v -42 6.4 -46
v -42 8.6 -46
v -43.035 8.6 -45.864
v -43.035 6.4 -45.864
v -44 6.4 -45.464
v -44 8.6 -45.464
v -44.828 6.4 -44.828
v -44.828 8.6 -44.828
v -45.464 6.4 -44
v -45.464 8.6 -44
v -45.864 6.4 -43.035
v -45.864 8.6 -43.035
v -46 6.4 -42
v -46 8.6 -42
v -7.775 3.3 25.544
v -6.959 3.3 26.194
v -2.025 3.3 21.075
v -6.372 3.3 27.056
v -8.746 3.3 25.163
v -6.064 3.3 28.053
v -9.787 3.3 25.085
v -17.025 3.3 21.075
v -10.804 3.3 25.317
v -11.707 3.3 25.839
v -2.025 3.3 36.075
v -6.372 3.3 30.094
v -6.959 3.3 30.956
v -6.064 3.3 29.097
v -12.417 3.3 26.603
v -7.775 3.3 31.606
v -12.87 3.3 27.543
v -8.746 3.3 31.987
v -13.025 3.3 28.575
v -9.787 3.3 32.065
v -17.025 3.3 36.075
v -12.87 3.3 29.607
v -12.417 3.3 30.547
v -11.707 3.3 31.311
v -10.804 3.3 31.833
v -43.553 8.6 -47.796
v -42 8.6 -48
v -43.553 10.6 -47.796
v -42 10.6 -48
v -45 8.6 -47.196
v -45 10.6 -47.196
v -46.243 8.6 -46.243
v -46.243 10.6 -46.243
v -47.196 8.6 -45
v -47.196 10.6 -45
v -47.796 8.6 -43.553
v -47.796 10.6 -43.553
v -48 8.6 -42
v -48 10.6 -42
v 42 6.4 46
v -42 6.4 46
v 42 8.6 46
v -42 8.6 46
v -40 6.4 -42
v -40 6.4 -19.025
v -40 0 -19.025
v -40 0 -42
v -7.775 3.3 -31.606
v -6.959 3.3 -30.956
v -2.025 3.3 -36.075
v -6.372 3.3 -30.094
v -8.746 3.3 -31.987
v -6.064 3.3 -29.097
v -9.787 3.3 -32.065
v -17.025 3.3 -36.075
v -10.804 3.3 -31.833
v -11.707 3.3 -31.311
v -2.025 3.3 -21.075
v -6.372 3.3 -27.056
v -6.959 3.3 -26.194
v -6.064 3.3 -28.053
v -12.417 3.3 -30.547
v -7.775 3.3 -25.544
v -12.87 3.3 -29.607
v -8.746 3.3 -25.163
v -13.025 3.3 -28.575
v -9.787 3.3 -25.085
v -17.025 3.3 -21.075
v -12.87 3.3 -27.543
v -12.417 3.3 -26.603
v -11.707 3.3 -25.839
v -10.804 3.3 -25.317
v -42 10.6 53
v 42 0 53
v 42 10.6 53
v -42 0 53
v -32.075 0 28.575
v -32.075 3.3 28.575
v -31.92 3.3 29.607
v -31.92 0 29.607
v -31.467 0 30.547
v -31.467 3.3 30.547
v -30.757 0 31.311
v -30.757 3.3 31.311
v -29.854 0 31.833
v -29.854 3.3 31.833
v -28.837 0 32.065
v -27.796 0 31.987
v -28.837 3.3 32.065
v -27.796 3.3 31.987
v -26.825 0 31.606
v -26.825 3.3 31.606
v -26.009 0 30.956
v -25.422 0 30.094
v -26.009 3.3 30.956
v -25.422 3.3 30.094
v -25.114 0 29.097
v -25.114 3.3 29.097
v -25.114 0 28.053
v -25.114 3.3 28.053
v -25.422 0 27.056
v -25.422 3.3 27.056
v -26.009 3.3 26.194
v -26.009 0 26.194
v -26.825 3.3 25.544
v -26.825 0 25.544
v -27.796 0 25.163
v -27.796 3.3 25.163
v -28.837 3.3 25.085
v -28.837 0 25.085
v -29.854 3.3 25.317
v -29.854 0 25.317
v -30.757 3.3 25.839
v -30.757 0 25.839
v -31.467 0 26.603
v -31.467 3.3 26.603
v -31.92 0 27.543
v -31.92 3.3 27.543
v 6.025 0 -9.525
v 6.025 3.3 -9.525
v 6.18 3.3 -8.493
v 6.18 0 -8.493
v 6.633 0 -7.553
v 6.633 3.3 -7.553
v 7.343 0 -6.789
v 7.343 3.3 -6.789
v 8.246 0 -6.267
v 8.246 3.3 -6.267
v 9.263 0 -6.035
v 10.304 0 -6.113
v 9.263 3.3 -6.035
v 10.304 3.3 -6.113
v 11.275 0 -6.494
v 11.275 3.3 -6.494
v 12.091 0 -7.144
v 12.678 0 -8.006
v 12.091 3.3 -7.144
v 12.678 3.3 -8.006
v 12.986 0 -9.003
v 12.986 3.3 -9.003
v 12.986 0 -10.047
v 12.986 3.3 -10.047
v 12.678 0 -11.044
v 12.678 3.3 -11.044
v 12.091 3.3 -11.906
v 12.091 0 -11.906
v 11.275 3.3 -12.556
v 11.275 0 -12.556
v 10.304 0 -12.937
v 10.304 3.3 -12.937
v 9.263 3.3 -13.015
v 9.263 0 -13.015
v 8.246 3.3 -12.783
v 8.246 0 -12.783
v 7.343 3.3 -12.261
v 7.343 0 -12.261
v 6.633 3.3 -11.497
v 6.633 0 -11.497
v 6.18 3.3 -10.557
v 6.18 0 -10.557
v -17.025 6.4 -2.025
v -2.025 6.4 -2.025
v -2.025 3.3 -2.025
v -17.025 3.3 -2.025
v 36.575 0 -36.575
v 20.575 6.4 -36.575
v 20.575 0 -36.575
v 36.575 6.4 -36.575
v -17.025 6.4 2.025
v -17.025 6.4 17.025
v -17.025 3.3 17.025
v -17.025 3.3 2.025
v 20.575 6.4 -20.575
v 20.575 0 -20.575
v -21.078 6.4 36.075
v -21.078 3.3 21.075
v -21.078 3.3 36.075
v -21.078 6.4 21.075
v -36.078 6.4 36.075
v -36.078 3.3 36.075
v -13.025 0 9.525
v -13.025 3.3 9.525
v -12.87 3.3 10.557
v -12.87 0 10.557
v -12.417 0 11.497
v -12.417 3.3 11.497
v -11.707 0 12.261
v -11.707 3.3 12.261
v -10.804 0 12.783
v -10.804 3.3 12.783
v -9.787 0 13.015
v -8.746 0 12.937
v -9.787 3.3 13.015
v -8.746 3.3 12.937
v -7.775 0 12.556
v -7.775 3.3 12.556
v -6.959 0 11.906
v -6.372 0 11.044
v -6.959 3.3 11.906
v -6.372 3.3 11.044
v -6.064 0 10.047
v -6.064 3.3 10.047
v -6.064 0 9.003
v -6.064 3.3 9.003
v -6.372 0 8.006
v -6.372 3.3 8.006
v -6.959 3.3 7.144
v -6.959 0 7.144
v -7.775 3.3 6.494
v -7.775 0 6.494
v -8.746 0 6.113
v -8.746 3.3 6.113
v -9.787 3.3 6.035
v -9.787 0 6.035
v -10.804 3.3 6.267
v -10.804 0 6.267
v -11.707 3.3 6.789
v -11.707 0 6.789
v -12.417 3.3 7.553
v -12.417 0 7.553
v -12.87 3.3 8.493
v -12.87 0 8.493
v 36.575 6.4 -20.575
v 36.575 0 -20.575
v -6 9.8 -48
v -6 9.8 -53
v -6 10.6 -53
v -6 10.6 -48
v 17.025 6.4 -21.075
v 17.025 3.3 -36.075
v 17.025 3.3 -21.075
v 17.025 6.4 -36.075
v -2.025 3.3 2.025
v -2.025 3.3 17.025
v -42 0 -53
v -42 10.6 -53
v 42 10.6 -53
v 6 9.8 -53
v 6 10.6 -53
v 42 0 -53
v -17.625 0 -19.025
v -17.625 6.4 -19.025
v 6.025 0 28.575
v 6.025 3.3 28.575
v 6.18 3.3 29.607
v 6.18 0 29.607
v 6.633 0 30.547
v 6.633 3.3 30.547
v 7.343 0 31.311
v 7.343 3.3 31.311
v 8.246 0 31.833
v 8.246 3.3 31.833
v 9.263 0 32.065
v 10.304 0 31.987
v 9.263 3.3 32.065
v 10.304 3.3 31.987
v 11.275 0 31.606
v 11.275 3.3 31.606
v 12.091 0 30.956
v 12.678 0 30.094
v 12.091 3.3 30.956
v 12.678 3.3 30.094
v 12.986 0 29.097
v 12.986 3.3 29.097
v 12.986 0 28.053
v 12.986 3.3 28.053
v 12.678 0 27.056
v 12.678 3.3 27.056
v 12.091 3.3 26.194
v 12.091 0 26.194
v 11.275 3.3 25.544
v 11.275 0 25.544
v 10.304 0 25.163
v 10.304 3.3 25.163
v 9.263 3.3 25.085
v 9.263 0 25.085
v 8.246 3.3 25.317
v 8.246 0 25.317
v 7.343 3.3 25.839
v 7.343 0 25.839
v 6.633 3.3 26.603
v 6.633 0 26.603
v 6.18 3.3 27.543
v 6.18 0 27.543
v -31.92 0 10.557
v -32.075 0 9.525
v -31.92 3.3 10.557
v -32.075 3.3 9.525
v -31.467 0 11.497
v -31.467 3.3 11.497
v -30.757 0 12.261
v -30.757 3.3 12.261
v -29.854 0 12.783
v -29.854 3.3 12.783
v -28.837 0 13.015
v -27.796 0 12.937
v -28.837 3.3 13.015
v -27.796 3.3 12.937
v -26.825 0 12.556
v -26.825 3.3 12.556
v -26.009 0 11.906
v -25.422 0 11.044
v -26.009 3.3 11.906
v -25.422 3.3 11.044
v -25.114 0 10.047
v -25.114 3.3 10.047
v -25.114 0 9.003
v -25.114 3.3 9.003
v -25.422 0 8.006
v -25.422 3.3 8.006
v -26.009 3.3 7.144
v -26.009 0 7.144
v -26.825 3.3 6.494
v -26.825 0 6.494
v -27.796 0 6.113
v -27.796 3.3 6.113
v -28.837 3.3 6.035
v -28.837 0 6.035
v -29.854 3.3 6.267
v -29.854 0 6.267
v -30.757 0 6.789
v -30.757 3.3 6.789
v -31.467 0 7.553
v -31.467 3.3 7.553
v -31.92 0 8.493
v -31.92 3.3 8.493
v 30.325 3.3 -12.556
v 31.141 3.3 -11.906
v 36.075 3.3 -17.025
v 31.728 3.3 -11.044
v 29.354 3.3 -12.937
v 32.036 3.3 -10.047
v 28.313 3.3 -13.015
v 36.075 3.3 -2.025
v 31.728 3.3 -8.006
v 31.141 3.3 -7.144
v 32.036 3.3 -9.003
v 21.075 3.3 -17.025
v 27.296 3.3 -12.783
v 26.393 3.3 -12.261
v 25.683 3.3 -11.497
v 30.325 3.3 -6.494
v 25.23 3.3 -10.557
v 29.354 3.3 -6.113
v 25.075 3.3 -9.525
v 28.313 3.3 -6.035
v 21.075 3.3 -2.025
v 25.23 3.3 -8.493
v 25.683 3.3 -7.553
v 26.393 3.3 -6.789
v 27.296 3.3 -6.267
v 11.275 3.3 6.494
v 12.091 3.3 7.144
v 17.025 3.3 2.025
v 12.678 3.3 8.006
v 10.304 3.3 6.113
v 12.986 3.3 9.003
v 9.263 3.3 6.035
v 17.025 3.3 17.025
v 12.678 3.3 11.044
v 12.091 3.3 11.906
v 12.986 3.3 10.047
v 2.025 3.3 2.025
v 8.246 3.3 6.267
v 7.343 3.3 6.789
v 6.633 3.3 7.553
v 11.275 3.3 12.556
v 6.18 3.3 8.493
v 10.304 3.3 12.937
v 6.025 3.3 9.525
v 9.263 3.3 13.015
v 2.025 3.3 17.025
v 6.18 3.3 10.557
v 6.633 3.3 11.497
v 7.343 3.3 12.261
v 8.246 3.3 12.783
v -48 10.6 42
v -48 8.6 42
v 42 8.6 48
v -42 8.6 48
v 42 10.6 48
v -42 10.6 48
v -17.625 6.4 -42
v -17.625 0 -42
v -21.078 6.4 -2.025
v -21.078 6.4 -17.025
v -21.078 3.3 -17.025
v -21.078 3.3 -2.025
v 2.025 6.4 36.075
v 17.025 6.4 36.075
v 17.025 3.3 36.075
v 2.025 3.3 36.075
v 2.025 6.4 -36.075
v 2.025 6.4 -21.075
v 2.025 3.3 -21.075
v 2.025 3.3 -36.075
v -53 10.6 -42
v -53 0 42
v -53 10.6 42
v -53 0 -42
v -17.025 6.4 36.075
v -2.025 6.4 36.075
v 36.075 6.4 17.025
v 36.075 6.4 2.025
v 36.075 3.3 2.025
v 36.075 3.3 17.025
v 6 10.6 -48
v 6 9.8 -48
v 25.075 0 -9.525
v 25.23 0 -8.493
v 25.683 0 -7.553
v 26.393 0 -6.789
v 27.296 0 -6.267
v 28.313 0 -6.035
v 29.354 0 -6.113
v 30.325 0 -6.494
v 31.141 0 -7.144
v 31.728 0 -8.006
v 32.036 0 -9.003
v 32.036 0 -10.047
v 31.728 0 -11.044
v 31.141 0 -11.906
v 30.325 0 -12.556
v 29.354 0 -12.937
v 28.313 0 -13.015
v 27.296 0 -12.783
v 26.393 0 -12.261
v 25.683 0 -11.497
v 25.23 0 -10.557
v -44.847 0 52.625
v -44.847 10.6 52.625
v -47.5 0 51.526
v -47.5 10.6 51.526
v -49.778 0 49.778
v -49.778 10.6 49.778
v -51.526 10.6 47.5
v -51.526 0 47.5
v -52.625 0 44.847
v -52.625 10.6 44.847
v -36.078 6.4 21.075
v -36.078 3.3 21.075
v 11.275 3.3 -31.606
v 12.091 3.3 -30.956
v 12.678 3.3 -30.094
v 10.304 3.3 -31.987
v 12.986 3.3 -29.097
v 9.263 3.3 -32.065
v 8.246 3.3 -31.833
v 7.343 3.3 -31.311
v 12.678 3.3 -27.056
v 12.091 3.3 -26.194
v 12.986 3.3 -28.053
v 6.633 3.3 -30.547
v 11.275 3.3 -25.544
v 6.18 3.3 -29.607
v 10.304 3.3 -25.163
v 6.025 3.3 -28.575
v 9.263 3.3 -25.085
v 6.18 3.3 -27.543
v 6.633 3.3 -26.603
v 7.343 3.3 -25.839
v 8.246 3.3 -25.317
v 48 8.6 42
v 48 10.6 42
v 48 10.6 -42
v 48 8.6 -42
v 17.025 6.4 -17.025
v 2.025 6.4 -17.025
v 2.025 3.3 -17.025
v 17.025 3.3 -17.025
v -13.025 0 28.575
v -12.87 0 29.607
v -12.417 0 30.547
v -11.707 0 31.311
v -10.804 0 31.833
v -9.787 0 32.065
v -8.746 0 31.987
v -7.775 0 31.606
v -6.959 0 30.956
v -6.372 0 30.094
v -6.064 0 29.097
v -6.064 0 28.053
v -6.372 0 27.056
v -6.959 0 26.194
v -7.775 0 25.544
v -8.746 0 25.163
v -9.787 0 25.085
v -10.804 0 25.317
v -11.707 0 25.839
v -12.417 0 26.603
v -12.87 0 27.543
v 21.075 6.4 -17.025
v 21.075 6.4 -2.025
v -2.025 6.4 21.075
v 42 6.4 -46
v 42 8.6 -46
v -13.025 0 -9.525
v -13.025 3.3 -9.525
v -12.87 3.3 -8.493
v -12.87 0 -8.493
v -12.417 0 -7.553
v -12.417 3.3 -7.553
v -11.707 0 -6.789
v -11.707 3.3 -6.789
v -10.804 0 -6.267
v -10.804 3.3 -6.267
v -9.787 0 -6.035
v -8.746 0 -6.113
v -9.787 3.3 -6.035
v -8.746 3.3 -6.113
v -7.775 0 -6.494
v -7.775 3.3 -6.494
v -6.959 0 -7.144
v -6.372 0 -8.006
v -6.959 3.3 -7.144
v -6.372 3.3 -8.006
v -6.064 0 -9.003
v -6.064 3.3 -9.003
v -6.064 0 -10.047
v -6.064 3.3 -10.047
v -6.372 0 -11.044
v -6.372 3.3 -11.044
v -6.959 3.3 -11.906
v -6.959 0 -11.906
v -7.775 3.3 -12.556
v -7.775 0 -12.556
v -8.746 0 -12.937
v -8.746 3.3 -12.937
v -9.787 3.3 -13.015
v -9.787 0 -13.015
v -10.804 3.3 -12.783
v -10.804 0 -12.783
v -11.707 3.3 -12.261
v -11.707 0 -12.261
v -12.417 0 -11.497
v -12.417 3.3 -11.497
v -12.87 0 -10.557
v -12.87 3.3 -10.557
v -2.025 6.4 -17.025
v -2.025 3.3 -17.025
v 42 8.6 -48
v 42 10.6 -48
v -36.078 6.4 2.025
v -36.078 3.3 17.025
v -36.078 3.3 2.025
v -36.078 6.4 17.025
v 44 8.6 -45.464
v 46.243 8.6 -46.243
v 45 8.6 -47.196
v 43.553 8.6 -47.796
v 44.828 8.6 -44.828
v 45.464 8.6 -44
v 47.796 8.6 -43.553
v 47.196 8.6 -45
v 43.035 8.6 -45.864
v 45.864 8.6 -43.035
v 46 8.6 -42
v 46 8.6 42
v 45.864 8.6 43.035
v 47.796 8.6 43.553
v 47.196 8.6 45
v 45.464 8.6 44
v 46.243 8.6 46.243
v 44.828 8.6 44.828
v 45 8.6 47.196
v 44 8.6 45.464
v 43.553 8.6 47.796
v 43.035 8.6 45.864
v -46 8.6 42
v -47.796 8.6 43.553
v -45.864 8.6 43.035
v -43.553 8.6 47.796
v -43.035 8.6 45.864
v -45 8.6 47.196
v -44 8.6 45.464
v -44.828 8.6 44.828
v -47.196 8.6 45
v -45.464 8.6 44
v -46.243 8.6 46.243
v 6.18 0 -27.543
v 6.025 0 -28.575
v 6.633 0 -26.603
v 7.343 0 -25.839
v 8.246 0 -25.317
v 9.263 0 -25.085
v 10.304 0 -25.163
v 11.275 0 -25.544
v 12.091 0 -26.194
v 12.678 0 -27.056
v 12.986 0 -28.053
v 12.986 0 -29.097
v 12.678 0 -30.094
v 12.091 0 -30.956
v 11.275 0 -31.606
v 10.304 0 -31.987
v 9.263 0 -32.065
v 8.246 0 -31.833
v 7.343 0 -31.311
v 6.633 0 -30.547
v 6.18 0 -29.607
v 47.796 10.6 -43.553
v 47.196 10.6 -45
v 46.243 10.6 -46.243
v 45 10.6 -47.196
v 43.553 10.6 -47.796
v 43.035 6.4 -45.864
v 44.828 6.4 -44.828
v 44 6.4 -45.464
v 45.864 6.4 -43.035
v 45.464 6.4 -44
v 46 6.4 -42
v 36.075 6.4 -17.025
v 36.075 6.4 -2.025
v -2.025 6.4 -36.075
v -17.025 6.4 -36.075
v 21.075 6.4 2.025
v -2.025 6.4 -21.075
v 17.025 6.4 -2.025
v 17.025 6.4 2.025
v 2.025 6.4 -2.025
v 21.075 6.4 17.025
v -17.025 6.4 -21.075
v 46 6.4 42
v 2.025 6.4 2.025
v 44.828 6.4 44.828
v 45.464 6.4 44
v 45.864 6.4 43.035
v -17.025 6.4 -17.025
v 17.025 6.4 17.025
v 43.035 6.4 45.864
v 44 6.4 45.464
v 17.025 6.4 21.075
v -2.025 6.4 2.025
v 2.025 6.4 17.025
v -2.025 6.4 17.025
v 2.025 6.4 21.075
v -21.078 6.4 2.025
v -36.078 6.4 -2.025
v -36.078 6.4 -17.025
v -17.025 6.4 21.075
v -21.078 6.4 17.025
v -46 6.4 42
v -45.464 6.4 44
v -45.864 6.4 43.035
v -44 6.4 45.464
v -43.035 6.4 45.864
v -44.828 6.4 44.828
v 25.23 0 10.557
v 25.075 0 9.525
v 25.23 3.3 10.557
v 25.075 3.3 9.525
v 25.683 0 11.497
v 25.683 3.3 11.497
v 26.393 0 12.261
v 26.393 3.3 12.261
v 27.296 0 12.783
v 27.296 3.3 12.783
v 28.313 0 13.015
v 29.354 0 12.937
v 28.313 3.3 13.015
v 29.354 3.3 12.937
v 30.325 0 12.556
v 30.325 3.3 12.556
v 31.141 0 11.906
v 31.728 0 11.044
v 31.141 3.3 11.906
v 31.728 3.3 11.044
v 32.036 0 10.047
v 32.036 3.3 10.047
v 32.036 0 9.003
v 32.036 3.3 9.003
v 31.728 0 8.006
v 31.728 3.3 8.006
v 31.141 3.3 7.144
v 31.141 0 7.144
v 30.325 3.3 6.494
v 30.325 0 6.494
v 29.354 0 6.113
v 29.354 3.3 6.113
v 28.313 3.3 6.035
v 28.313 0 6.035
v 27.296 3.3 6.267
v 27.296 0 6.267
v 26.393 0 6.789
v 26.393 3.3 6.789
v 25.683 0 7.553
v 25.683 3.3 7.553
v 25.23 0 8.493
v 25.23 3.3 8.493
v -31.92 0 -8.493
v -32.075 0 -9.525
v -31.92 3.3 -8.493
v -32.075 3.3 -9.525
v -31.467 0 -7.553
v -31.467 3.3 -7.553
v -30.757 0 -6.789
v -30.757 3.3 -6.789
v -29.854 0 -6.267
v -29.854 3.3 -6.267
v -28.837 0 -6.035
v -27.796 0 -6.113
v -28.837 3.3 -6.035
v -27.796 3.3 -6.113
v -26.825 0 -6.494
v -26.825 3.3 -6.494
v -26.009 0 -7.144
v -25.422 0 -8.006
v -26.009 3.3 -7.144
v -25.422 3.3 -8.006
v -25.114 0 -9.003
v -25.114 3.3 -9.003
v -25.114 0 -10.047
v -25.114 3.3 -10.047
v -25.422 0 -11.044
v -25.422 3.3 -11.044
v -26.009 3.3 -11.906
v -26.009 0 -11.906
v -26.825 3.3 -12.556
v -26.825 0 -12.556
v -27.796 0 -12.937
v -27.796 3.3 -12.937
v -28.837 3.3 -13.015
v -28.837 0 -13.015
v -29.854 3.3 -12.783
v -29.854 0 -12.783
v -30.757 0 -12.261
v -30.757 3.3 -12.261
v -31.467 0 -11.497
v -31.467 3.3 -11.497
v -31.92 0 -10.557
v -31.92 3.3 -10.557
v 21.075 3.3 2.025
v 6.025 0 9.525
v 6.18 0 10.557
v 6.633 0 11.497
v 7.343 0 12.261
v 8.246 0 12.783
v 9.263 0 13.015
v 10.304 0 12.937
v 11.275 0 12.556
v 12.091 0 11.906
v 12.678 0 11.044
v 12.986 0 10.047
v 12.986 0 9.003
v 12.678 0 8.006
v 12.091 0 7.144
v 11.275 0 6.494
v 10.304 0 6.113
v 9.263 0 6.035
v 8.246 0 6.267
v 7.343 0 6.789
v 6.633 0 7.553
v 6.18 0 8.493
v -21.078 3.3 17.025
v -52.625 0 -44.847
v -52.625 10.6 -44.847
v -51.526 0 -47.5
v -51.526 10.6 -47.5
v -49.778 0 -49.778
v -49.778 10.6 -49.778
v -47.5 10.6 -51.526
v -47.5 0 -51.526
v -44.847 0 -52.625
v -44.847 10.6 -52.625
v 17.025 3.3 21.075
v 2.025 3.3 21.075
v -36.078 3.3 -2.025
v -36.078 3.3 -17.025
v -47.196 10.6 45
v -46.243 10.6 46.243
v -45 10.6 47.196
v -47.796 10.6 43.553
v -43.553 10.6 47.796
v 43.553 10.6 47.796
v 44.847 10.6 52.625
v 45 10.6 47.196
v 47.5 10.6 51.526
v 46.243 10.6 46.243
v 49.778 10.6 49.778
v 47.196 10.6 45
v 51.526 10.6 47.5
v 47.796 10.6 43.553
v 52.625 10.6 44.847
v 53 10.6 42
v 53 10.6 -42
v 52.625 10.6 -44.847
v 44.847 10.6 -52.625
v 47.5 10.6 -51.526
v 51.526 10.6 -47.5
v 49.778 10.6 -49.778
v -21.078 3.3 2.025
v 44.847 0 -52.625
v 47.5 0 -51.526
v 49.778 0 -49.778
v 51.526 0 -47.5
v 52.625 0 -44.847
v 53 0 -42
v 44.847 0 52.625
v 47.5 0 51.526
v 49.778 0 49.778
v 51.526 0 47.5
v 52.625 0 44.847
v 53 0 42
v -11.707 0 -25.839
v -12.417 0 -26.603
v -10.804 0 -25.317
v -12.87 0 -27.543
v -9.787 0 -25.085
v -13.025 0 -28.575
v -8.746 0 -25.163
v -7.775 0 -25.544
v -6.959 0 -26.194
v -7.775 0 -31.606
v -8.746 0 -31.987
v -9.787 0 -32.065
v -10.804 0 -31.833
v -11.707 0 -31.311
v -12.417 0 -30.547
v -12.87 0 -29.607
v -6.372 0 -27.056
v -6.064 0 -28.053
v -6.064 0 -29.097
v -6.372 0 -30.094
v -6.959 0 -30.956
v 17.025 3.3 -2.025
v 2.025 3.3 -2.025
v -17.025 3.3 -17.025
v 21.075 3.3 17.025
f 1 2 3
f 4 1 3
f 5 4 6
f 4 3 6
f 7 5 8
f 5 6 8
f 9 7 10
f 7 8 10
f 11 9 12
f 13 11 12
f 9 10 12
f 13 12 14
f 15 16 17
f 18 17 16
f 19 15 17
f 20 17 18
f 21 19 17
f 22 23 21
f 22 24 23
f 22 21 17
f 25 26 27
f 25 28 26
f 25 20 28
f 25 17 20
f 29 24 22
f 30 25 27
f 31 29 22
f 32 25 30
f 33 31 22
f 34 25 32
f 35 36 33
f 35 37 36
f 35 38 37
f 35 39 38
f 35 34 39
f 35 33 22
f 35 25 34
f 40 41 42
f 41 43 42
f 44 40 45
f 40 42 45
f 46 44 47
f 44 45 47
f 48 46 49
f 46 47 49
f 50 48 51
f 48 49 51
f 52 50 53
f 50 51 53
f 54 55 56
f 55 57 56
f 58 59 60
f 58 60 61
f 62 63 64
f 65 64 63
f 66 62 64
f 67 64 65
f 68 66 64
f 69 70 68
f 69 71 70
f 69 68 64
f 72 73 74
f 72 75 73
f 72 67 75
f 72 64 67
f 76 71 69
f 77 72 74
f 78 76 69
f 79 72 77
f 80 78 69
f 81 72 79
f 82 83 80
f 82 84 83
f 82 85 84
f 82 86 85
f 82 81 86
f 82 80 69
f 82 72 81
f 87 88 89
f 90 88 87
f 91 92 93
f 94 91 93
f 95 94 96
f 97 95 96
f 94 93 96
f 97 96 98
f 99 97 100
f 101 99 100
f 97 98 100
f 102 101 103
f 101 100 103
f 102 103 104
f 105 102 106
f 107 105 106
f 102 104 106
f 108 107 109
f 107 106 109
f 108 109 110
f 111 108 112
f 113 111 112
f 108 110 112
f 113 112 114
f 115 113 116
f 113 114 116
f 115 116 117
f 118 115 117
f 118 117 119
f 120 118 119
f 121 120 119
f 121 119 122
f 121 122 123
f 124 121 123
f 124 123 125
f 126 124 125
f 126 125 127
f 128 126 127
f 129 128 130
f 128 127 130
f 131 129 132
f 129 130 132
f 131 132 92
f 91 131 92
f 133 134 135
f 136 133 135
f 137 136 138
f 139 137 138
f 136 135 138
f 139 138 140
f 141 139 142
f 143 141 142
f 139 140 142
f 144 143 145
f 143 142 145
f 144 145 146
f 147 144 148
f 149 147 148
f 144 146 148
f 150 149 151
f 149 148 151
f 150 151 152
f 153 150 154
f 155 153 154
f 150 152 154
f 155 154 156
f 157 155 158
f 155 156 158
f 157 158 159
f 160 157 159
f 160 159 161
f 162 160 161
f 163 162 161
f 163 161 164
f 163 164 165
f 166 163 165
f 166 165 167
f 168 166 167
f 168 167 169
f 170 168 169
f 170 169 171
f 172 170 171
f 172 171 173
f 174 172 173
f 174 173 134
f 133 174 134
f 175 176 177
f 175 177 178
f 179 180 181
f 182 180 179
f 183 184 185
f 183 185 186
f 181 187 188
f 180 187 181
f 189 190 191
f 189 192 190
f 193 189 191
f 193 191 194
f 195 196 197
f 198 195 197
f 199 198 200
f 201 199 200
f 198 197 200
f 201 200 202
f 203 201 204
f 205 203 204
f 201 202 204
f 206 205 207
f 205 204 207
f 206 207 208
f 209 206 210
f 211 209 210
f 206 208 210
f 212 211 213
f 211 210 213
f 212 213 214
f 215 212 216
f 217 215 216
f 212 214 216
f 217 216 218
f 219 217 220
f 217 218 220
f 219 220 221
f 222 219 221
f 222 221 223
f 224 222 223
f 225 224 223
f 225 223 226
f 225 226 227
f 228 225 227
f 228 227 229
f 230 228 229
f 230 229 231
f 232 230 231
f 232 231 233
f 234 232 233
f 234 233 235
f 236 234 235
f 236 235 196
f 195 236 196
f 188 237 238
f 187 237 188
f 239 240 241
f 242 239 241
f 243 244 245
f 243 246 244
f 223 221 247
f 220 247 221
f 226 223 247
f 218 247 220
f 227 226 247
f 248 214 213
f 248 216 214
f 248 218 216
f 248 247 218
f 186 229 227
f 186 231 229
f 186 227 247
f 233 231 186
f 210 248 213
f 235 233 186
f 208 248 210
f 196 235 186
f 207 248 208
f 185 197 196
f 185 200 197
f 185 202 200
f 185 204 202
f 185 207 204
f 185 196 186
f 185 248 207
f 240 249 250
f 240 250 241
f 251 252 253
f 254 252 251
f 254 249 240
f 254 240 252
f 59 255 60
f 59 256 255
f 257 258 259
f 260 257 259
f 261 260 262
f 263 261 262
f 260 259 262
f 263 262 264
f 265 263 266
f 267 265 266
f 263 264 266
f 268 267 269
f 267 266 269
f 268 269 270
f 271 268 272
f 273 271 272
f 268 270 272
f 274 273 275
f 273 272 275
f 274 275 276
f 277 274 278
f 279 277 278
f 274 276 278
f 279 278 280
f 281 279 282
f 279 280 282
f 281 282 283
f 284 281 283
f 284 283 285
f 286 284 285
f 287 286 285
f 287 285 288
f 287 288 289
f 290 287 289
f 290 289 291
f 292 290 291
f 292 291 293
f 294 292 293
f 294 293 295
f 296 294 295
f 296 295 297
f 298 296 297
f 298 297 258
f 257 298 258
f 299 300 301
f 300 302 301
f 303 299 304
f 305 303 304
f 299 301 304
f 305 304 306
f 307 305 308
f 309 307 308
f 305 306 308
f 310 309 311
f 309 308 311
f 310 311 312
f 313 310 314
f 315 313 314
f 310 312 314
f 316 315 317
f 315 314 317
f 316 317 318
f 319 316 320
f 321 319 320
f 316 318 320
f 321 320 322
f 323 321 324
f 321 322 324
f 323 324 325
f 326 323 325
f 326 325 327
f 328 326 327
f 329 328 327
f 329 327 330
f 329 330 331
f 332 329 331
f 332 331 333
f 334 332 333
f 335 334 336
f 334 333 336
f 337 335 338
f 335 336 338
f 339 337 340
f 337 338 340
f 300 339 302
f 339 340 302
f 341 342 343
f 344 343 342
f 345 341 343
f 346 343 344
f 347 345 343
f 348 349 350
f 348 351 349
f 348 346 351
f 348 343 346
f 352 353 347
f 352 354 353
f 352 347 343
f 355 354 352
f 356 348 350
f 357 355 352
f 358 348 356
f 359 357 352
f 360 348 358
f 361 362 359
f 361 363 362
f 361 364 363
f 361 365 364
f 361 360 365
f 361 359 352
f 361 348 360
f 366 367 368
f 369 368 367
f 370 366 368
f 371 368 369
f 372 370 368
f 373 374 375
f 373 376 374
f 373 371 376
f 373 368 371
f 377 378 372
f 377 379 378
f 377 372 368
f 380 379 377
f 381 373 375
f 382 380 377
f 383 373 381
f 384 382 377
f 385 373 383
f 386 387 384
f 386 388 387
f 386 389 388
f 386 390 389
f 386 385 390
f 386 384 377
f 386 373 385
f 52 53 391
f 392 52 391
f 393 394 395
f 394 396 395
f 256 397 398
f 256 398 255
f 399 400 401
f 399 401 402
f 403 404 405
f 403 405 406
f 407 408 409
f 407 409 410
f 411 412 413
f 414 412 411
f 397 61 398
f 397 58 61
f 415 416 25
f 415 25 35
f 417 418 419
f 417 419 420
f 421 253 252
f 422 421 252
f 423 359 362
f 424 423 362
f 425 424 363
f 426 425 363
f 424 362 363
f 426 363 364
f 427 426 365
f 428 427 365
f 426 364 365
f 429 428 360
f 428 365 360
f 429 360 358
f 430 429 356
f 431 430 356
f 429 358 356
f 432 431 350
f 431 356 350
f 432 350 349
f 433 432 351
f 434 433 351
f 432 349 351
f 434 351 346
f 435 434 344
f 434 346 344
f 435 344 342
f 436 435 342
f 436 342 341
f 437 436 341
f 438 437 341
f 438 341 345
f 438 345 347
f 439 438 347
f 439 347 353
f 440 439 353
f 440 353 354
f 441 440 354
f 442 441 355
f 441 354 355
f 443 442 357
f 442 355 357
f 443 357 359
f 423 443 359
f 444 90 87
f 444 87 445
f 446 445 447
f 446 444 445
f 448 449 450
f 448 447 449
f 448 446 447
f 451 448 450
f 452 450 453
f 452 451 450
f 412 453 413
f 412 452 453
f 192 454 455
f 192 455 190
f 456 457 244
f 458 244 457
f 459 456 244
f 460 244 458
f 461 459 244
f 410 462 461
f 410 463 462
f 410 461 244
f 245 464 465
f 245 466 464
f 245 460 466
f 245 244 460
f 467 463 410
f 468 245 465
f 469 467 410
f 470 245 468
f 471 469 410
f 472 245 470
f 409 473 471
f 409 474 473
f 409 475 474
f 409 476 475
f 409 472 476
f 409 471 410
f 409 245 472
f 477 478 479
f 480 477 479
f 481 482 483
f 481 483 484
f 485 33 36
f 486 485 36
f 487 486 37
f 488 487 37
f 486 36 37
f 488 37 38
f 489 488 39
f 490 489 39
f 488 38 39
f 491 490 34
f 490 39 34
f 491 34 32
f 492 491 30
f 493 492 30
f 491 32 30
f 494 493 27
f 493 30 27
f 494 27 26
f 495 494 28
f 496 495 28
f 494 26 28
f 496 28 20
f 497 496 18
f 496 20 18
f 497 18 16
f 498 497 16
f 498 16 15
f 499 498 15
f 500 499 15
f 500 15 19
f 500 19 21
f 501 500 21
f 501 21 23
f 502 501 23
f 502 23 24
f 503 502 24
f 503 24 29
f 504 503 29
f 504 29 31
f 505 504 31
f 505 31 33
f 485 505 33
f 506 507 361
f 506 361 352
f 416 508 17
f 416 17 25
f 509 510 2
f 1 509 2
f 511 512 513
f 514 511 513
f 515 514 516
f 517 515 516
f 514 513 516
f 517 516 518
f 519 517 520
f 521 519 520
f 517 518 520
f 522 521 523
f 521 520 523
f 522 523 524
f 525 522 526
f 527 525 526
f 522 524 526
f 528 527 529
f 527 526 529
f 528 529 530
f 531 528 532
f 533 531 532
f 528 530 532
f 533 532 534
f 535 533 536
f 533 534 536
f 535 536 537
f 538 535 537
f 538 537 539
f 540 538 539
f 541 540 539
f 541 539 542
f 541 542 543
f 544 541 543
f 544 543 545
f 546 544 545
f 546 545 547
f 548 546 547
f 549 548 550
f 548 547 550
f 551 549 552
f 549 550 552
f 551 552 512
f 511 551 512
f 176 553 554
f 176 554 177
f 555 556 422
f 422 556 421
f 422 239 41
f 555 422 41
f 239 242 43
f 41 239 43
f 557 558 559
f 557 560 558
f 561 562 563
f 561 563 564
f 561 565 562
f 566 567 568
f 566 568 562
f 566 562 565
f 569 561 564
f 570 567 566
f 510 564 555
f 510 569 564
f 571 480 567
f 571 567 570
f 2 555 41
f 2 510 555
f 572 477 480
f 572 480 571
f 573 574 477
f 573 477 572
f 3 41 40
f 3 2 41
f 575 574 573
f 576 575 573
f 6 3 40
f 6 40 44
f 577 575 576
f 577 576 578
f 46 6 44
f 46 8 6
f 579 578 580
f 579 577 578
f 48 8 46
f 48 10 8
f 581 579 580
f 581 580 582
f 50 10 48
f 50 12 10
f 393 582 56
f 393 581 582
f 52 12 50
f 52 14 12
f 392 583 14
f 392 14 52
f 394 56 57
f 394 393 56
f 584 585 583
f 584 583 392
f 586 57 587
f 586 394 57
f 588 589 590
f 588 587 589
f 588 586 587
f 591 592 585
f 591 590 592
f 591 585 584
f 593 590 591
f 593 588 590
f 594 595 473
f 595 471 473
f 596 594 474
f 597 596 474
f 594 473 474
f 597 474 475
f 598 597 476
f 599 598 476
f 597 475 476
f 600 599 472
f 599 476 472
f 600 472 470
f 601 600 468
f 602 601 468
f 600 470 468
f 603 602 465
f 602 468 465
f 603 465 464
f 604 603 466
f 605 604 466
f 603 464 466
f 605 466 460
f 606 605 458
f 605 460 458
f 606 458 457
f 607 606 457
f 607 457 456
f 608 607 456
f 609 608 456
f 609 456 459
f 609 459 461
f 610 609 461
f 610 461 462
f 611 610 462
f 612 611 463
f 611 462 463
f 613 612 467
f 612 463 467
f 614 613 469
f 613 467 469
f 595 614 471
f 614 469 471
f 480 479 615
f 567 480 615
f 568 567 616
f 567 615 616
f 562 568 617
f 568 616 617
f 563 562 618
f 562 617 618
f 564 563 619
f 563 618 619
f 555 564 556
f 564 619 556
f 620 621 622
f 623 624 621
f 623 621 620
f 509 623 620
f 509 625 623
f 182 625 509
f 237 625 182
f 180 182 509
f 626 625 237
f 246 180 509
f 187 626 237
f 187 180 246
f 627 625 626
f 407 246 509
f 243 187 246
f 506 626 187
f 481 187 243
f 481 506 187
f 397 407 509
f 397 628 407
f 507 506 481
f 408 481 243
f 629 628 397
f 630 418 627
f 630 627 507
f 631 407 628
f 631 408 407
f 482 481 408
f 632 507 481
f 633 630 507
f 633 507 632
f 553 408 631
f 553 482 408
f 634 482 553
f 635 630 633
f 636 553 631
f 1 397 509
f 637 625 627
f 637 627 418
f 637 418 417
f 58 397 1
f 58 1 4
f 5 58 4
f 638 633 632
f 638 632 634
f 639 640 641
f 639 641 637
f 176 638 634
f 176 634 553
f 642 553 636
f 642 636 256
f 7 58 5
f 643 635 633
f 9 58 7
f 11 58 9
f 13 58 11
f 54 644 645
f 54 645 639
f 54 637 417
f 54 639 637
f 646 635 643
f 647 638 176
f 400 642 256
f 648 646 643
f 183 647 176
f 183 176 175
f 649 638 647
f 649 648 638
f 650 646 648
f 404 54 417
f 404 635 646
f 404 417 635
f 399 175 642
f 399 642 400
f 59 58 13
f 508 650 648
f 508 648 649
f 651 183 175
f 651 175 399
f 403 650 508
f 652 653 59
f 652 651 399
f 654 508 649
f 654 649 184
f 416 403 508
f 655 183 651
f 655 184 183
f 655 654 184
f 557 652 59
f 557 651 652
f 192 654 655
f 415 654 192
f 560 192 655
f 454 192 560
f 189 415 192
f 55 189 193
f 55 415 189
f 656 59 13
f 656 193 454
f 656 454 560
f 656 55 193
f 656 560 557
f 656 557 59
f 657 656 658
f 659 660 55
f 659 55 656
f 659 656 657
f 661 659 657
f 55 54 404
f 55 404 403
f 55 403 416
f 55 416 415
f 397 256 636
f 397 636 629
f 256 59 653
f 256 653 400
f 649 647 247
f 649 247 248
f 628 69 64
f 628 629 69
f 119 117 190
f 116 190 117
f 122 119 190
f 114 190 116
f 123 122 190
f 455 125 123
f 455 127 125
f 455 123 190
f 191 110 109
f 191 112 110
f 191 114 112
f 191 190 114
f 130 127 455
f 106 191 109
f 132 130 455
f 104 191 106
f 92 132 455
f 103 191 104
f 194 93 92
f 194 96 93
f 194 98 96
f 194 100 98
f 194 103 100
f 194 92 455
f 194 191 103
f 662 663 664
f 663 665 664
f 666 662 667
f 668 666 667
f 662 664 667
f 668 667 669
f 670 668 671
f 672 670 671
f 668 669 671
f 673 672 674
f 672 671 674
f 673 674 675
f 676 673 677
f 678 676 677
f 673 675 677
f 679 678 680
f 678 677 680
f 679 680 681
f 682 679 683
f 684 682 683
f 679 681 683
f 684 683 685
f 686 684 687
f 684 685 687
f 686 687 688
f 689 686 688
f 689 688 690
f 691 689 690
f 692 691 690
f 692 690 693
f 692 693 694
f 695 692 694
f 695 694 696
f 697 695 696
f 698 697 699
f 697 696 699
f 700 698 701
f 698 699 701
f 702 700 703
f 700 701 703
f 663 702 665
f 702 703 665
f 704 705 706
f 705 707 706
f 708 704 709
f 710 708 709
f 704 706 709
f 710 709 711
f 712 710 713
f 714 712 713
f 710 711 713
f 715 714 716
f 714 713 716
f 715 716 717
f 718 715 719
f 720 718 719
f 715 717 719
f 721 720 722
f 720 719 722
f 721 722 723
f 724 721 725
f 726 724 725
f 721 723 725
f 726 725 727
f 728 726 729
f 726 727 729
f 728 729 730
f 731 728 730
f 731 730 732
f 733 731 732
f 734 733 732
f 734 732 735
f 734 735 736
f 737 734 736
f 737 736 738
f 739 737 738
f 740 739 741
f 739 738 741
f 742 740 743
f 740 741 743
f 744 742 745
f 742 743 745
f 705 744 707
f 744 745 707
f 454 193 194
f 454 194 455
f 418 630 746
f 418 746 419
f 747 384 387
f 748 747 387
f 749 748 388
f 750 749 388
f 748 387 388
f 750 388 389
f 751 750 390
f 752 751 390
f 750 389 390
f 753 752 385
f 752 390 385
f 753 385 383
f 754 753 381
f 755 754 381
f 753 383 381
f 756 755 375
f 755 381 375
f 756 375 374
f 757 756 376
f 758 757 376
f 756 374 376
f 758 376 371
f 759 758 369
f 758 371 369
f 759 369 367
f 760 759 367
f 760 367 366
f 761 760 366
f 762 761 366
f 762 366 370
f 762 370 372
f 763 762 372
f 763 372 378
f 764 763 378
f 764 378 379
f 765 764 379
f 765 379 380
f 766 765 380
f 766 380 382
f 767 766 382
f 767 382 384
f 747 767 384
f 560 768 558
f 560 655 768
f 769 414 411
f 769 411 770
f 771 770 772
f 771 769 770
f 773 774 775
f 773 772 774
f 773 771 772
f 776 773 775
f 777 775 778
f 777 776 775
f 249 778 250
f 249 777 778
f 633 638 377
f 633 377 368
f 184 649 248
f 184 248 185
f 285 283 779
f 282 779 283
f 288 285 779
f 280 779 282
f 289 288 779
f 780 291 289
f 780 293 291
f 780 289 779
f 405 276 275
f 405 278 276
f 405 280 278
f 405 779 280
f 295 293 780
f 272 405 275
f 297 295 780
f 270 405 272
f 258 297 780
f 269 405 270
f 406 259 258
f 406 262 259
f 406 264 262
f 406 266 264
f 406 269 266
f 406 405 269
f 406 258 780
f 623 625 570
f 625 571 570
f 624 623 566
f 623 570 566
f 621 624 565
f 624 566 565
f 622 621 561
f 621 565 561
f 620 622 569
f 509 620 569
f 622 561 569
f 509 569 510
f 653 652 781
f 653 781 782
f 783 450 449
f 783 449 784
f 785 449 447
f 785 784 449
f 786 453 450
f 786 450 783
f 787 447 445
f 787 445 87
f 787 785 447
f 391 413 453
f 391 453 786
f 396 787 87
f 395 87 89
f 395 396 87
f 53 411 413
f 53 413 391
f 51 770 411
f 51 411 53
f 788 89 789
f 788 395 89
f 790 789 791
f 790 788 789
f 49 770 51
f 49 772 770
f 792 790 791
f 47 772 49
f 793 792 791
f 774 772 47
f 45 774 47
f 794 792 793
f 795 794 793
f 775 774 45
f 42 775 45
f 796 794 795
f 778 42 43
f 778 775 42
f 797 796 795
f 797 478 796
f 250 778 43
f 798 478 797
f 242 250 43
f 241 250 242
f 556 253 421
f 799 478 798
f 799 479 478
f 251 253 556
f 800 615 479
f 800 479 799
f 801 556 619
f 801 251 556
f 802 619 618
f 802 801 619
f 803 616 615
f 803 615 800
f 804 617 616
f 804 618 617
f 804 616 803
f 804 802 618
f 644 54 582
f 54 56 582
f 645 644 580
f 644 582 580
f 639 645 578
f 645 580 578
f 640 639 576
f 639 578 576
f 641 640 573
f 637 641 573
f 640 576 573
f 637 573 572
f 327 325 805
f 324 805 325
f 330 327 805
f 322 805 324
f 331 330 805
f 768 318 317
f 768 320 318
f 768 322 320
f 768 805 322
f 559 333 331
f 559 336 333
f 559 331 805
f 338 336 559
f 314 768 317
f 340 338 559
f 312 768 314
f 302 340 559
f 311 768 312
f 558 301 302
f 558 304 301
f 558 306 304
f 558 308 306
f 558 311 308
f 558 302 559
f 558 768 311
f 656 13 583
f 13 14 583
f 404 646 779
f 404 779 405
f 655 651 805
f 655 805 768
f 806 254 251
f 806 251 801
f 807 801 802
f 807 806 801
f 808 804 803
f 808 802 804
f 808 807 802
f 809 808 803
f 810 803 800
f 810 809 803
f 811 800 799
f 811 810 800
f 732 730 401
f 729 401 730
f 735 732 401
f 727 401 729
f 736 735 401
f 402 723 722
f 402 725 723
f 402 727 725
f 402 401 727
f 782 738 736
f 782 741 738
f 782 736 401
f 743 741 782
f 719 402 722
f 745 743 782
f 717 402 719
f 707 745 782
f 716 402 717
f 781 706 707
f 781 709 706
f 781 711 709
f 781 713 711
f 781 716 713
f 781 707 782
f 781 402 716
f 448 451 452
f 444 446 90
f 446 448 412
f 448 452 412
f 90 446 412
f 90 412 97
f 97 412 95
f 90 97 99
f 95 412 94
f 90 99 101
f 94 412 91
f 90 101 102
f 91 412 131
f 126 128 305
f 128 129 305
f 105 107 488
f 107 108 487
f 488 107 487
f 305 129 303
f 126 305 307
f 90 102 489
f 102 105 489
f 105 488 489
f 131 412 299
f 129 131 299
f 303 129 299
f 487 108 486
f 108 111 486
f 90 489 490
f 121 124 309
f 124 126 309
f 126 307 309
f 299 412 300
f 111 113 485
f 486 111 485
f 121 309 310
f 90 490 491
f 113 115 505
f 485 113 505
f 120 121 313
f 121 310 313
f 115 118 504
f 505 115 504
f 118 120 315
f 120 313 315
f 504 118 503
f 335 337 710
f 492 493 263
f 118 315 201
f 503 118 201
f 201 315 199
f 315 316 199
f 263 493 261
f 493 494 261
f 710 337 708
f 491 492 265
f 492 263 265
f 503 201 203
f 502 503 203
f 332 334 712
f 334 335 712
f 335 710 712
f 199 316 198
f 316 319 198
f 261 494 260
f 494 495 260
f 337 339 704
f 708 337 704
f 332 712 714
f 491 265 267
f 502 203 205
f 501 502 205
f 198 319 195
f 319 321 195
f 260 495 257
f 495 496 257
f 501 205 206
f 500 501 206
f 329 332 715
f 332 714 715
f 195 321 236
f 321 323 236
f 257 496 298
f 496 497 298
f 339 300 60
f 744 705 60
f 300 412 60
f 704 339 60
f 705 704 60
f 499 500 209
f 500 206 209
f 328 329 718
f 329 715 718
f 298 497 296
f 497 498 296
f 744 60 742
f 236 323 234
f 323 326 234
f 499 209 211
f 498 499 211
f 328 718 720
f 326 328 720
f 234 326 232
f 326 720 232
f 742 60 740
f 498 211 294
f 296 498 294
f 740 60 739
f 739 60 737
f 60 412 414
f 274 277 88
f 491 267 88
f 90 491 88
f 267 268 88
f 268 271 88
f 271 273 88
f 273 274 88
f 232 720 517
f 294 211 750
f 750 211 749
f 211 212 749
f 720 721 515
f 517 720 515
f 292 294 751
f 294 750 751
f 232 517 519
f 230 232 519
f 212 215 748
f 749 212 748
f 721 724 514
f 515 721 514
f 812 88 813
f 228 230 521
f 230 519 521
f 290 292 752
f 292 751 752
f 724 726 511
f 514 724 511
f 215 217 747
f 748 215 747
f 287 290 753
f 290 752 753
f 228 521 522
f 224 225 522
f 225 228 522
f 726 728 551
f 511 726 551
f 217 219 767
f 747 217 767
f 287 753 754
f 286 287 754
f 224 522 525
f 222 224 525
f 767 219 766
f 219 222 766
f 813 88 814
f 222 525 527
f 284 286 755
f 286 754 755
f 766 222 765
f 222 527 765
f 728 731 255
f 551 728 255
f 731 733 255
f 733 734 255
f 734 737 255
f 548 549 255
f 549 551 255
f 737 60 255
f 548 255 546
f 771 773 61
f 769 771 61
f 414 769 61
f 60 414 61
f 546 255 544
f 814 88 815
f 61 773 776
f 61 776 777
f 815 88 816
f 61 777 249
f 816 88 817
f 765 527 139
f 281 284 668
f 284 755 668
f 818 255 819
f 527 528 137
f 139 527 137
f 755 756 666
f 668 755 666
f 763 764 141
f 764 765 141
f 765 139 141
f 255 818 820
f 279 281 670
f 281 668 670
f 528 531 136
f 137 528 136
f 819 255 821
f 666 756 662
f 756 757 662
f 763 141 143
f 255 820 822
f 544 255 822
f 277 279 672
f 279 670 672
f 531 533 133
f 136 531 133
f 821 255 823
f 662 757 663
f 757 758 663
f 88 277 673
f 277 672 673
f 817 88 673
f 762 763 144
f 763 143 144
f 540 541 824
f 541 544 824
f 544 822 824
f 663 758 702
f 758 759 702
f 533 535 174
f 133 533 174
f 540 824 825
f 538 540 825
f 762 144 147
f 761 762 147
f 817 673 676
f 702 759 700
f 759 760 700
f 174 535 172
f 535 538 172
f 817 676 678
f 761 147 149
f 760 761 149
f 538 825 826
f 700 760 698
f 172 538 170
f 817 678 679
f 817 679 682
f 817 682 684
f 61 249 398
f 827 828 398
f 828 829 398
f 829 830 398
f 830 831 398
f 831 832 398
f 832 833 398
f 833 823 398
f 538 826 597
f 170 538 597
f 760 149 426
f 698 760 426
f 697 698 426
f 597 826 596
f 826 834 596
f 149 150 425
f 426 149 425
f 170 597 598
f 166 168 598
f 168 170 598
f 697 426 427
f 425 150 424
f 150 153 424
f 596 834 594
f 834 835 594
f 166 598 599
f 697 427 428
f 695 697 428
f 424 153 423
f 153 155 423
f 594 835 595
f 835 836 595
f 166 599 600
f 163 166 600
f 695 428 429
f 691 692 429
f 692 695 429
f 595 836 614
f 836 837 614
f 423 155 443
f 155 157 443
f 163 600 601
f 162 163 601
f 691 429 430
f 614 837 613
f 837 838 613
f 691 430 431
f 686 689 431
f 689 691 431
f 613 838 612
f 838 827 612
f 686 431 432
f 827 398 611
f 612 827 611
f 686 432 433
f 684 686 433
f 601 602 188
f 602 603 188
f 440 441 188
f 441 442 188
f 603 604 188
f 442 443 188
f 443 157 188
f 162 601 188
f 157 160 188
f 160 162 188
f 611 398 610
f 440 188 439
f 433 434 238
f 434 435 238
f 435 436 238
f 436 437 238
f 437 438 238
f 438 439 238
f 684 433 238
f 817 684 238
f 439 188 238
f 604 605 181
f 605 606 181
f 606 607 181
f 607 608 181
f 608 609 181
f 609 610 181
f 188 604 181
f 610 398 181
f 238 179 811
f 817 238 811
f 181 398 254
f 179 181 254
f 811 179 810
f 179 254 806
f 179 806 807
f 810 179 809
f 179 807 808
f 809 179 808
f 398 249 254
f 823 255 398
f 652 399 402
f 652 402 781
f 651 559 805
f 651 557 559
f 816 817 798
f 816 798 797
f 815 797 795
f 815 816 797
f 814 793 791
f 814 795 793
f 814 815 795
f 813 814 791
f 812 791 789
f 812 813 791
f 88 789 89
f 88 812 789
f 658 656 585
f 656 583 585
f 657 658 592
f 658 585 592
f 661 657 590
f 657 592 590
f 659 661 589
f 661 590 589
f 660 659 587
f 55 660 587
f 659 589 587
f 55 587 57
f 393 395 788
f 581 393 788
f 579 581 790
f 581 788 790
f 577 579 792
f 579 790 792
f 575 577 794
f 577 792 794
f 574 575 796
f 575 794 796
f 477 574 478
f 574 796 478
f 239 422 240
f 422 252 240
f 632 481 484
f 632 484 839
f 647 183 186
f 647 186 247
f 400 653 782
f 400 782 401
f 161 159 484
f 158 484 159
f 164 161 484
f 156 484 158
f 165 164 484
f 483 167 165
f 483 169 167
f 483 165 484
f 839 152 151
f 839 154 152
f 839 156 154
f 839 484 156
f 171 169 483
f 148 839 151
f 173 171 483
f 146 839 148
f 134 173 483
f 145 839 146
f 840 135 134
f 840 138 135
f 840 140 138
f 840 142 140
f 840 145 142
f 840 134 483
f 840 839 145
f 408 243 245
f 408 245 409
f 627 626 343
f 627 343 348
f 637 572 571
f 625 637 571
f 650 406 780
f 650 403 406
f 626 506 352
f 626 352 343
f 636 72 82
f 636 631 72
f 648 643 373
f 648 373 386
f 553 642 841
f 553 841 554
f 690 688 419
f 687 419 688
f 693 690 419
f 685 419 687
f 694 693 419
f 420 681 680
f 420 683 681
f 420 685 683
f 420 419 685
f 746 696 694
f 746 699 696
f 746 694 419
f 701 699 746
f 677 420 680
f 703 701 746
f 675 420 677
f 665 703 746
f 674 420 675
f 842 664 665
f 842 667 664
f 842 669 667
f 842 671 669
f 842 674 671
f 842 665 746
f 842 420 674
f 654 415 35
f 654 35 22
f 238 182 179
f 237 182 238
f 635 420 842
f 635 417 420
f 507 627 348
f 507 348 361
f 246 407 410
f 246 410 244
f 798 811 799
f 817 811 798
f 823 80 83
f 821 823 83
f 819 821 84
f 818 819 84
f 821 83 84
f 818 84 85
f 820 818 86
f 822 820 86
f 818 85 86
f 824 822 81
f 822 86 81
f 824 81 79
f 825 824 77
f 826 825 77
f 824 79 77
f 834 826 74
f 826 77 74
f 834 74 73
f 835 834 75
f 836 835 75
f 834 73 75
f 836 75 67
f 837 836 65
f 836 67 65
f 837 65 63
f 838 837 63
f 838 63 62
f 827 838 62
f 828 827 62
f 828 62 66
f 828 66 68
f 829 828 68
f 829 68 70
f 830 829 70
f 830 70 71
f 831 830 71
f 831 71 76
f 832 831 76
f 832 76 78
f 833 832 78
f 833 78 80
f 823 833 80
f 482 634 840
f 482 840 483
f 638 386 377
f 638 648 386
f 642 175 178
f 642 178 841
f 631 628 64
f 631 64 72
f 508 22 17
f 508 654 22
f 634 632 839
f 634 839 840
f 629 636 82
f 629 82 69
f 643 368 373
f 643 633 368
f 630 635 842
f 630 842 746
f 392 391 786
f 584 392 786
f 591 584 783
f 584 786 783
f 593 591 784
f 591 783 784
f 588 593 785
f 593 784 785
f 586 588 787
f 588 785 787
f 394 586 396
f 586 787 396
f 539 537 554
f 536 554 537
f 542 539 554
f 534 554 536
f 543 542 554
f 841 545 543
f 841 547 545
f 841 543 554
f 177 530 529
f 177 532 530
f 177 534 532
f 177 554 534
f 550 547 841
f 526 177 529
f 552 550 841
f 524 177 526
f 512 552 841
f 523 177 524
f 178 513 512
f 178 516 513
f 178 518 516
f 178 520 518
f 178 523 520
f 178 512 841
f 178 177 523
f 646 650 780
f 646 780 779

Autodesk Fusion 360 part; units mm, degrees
sketch "Sketch1" plane through (0, 0, 0) normal (0, 1, 0) x (1, 0, 0)
  line L0 (0, 0) -> (0, 32) construction
  line L1 (0, 0) -> (-33, 0) construction
  line L2 (-42, 53) -> (42, 53)
  line L3 (53, 42) -> (53, -42)
  line L4 (42, -53) -> (-42, -53)
  line L5 (-53, -42) -> (-53, 42)
  arc A0 (-42, 53) -> (-53, 42) centre (-42, 42) ccw
  arc A1 (-53, -42) -> (-42, -53) centre (-42, -42) ccw
  arc A2 (42, -53) -> (53, -42) centre (42, -42) ccw
  arc A3 (53, 42) -> (42, 53) centre (42, 42) ccw
  point P0 (-53, 53)
  point P1 (53, 53)
  dimension "d1" = 106
  dimension "d2" = 11
  dimension "d49" = 106
extrude "Extrude1" add sketch "Sketch1" along normal blind 10.6
sketch "Sketch2" plane through (0, 10.6, 0) normal (0, 1, 0) x (-1, 0, 0)
  arc A0 (-42, 53) -> (-53, 42) centre (-42, 42) ccw
  line L0 (-53, 42) -> (-53, -42)
  arc A1 (-53, -42) -> (-42, -53) centre (-42, -42) ccw
  line L1 (-42, -53) -> (42, -53)
  arc A2 (42, -53) -> (53, -42) centre (42, -42) ccw
  line L2 (53, -42) -> (53, 42)
  arc A3 (53, 42) -> (42, 53) centre (42, 42) ccw
  line L3 (42, 53) -> (-42, 53)
  line L4 (48, -42) -> (48, 42)
  arc A4 (48, 42) -> (42, 48) centre (42, 42) ccw
  line L5 (42, 48) -> (-42, 48)
  arc A5 (-42, 48) -> (-48, 42) centre (-42, 42) ccw
  line L6 (-48, 42) -> (-48, -42)
  arc A6 (-48, -42) -> (-42, -48) centre (-42, -42) ccw
  line L7 (-42, -48) -> (42, -48)
  arc A7 (42, -48) -> (48, -42) centre (42, -42) ccw
  dimension "d5" = -5
extrude "Extrude2" cut sketch "Sketch2" against normal blind 2 contours L4 A4 L5 A5 L6 A6 L7 A7
sketch "Sketch3" plane through (0, 8.6, 0) normal (0, 1, 0) x (-1, 0, 0)
  arc A0 (42, -48) -> (48, -42) centre (42, -42) ccw
  line L0 (48, -42) -> (48, 42)
  arc A1 (48, 42) -> (42, 48) centre (42, 42) ccw
  line L1 (42, 48) -> (-42, 48)
  arc A2 (-42, 48) -> (-48, 42) centre (-42, 42) ccw
  line L2 (-48, 42) -> (-48, -42)
  arc A3 (-48, -42) -> (-42, -48) centre (-42, -42) ccw
  line L3 (-42, -48) -> (42, -48)
  line L4 (46, -42) -> (46, 42)
  arc A4 (46, 42) -> (42, 46) centre (42, 42) ccw
  line L5 (42, 46) -> (-42, 46)
  arc A5 (-42, 46) -> (-46, 42) centre (-42, 42) ccw
  line L6 (-46, 42) -> (-46, -42)
  arc A6 (-46, -42) -> (-42, -46) centre (-42, -42) ccw
  line L7 (-42, -46) -> (42, -46)
  arc A7 (42, -46) -> (46, -42) centre (42, -42) ccw
  dimension "d8" = -2
extrude "Extrude3" cut sketch "Sketch3" against normal blind 2.2 contours L4 A4 L5 A5 L6 A6 L7 A7
sketch "Sketch5" plane through (0, 6.4, 0) normal (0, 1, 0) x (-1, 0, 0)
  arc A0 (42, -46) -> (46, -42) centre (42, -42) ccw
  line L0 (46, -42) -> (46, 42)
  arc A1 (46, 42) -> (42, 46) centre (42, 42) ccw
  line L1 (42, 46) -> (-42, 46)
  arc A2 (-42, 46) -> (-46, 42) centre (-42, 42) ccw
  line L2 (-46, 42) -> (-46, -42)
  arc A3 (-46, -42) -> (-42, -46) centre (-42, -42) ccw
  line L3 (-42, -46) -> (42, -46)
  line L4 (0, 0) -> (0, -26) construction
  line L5 (0, 0) -> (25, 0) construction
  line L6 (-2.025, -36.075) -> (-17.025, -36.075)
  line L7 (-17.025, -36.075) -> (-17.025, -21.075)
  line L8 (-17.025, -21.075) -> (-2.025, -21.075)
  line L9 (-2.025, -21.075) -> (-2.025, -36.075)
  line L10 (17.025, -36.075) -> (2.025, -36.075)
  line L11 (2.025, -36.075) -> (2.025, -21.075)
  line L12 (2.025, -21.075) -> (17.025, -21.075)
  line L13 (17.025, -21.075) -> (17.025, -36.075)
  line L14 (-21.075, -17.025) -> (-36.075, -17.025)
  line L15 (-36.075, -17.025) -> (-36.075, -2.025)
  line L16 (-36.075, -2.025) -> (-21.075, -2.025)
  line L17 (-21.075, -2.025) -> (-21.075, -17.025)
  line L18 (-2.025, -17.025) -> (-17.025, -17.025)
  line L19 (-17.025, -17.025) -> (-17.025, -2.025)
  line L20 (-17.025, -2.025) -> (-2.025, -2.025)
  line L21 (-2.025, -2.025) -> (-2.025, -17.025)
  line L22 (17.025, -17.025) -> (2.025, -17.025)
  line L23 (2.025, -17.025) -> (2.025, -2.025)
  line L24 (2.025, -2.025) -> (17.025, -2.025)
  line L25 (17.025, -2.025) -> (17.025, -17.025)
  line L26 (36.0775, -17.025) -> (21.0775, -17.025)
  line L27 (21.0775, -17.025) -> (21.0775, -2.025)
  line L28 (21.0775, -2.025) -> (36.0775, -2.025)
  line L29 (36.0775, -2.025) -> (36.0775, -17.025)
  line L30 (-21.075, 2.025) -> (-36.075, 2.025)
  line L31 (-36.075, 2.025) -> (-36.075, 17.025)
  line L32 (-36.075, 17.025) -> (-21.075, 17.025)
  line L33 (-21.075, 17.025) -> (-21.075, 2.025)
  line L34 (-2.025, 2.025) -> (-17.025, 2.025)
  line L35 (-17.025, 2.025) -> (-17.025, 17.025)
  line L36 (-17.025, 17.025) -> (-2.025, 17.025)
  line L37 (-2.025, 17.025) -> (-2.025, 2.025)
  line L38 (17.025, 2.025) -> (2.025, 2.025)
  line L39 (2.025, 2.025) -> (2.025, 17.025)
  line L40 (2.025, 17.025) -> (17.025, 17.025)
  line L41 (17.025, 17.025) -> (17.025, 2.025)
  line L42 (36.0775, 2.025) -> (21.0775, 2.025)
  line L43 (21.0775, 2.025) -> (21.0775, 17.025)
  line L44 (21.0775, 17.025) -> (36.0775, 17.025)
  line L45 (36.0775, 17.025) -> (36.0775, 2.025)
  line L46 (36.0775, 21.075) -> (21.0775, 21.075)
  line L47 (21.0775, 21.075) -> (21.0775, 36.075)
  line L48 (21.0775, 36.075) -> (36.0775, 36.075)
  line L49 (36.0775, 36.075) -> (36.0775, 21.075)
  line L50 (-2.025, 21.075) -> (-17.025, 21.075)
  line L51 (-17.025, 21.075) -> (-17.025, 36.075)
  line L52 (-17.025, 36.075) -> (-2.025, 36.075)
  line L53 (-2.025, 36.075) -> (-2.025, 21.075)
  line L54 (17.025, 21.075) -> (2.025, 21.075)
  line L55 (2.025, 21.075) -> (2.025, 36.075)
  line L56 (2.025, 36.075) -> (17.025, 36.075)
  line L57 (17.025, 36.075) -> (17.025, 21.075)
  line L58 (9.525, -36.075) -> (9.525, -21.075) construction
  line L59 (17.025, -28.575) -> (2.025, -28.575) construction
  line L60 (28.5775, -17.025) -> (28.5775, -2.025) construction
  line L61 (36.0775, -9.525) -> (21.0775, -9.525) construction
  line L62 (-2.025, 9.525) -> (-17.025, 9.525) construction
  line L63 (-9.525, 2.025) -> (-9.525, 17.025) construction
  line L64 (36.0775, 28.575) -> (21.0775, 28.575) construction
  dimension "d16" = 9.525
  dimension "d17" = 28.575
  dimension "d18" = 9.525
  dimension "d19" = 28.575
  dimension "d20" = 28.5775
  dimension "d21" = 9.525
  dimension "d23" = 15
  dimension "d24" = 9.525
extrude "Extrude5" cut sketch "Sketch5" against normal blind 3.1 contours L6 L7 L8 L9 | L10 L11 L12 L13 | L14 L15 L16 L17 | L18 L19 L20 L21 | L22 L23 L24 L25 | L26 L27 L28 L29 | L30 L31 L32 L33 | L34 L35 L36 L37 | L38 L39 L40 L41 | L42 L43 L44 L45 | L46 L47 L48 L49 | L50 L51 L52 L53 | L54 L55 L56 L57
sketch "Sketch6" plane through (0, 3.3, 0) normal (0, 1, 0) x (-1, 0, 0)
  line L0 (17.025, -21.075) -> (2.025, -21.075)
  line L1 (2.025, -21.075) -> (2.025, -36.075)
  line L2 (2.025, -36.075) -> (17.025, -36.075)
  line L3 (17.025, -36.075) -> (17.025, -21.075)
  line L4 (9.525, -36.075) -> (9.525, -21.075) construction
  line L5 (17.025, -28.575) -> (2.025, -28.575) construction
  circle A0 centre (9.525, -28.575) radius 3.5
  circle A1 centre (-9.525, -28.575) radius 3.5
  circle A2 centre (28.575, -9.525) radius 3.5
  circle A3 centre (9.525, -9.525) radius 3.5
  circle A4 centre (-9.525, -9.525) radius 3.5
  circle A5 centre (-28.575, -9.525) radius 3.5
  circle A6 centre (-28.575, 9.525) radius 3.5
  circle A7 centre (-9.525, 9.525) radius 3.5
  circle A8 centre (9.525, 9.525) radius 3.5
  circle A9 centre (28.575, 9.525) radius 3.5
  circle A10 centre (9.525, 28.575) radius 3.5
  circle A11 centre (-9.525, 28.575) radius 3.5
  circle A12 centre (28.575, 28.575) radius 3.5
  line L6 (46, -9.525) -> (-46, -9.525) construction
  line L7 (46, 9.525) -> (-46, 9.525) construction
  line L8 (28.575, -46) -> (28.575, 46) construction
  line L9 (-9.525, -46) -> (-9.525, 46) construction
  line L10 (-28.575, -46) -> (-28.575, 46) construction
  line L11 (46, 28.575) -> (-46, 28.575) construction
  line L12 (42, -46) -> (-42, -46)
  line L13 (-42, 46) -> (42, 46)
  line L14 (-46, -42) -> (-46, 42)
  line L15 (46, 42) -> (46, -42)
  dimension "d27" = 7
  dimension "d28" = 28.575
  dimension "d29" = 9.525
  dimension "d30" = 9.525
  dimension "d31" = 9.525
  dimension "d32" = 28.575
  dimension "d33" = 28.575
extrude "Extrude6" cut sketch "Sketch6" against normal up to surface (3.3 mm away) contours A0 | A1 | A2 | A3 | A4 | A5 | A6 | A7 | A8 | A9 | A10 | A11 | A12
sketch "Sketch7" plane through (0, 6.4, 0) normal (0, 1, 0) x (-1, 0, 0)
  arc A0 (42, -46) -> (46, -42) centre (42, -42) ccw
  line L0 (46, -42) -> (46, 42)
  arc A1 (46, 42) -> (42, 46) centre (42, 42) ccw
  line L1 (42, 46) -> (-42, 46)
  arc A2 (-42, 46) -> (-46, 42) centre (-42, 42) ccw
  line L2 (-46, 42) -> (-46, -42)
  arc A3 (-46, -42) -> (-42, -46) centre (-42, -42) ccw
  line L3 (-42, -46) -> (42, -46)
  line L4 (21.0775, 21.075) -> (21.0775, 36.075)
  line L5 (21.0775, 36.075) -> (36.0775, 36.075)
  line L6 (36.0775, 36.075) -> (36.0775, 21.075)
  line L7 (36.0775, 21.075) -> (21.0775, 21.075)
  line L8 (2.025, 2.025) -> (2.025, 17.025)
  line L9 (2.025, 17.025) -> (17.025, 17.025)
  line L10 (17.025, 17.025) -> (17.025, 2.025)
  line L11 (17.025, 2.025) -> (2.025, 2.025)
  line L12 (-17.025, -17.025) -> (-17.025, -2.025)
  line L13 (-17.025, -2.025) -> (-2.025, -2.025)
  line L14 (-2.025, -2.025) -> (-2.025, -17.025)
  line L15 (-2.025, -17.025) -> (-17.025, -17.025)
  line L16 (2.025, -36.075) -> (2.025, -21.075)
  line L17 (2.025, -21.075) -> (17.025, -21.075)
  line L18 (17.025, -21.075) -> (17.025, -36.075)
  line L19 (17.025, -36.075) -> (2.025, -36.075)
  line L20 (2.025, -17.025) -> (2.025, -2.025)
  line L21 (2.025, -2.025) -> (17.025, -2.025)
  line L22 (17.025, -2.025) -> (17.025, -17.025)
  line L23 (17.025, -17.025) -> (2.025, -17.025)
  line L24 (-17.025, 2.025) -> (-17.025, 17.025)
  line L25 (-17.025, 17.025) -> (-2.025, 17.025)
  line L26 (-2.025, 17.025) -> (-2.025, 2.025)
  line L27 (-2.025, 2.025) -> (-17.025, 2.025)
  line L28 (-17.025, 21.075) -> (-17.025, 36.075)
  line L29 (-17.025, 36.075) -> (-2.025, 36.075)
  line L30 (-2.025, 36.075) -> (-2.025, 21.075)
  line L31 (-2.025, 21.075) -> (-17.025, 21.075)
  line L32 (21.0775, 2.025) -> (21.0775, 17.025)
  line L33 (21.0775, 17.025) -> (36.0775, 17.025)
  line L34 (36.0775, 17.025) -> (36.0775, 2.025)
  line L35 (36.0775, 2.025) -> (21.0775, 2.025)
  line L36 (-36.075, -17.025) -> (-36.075, -2.025)
  line L37 (-36.075, -2.025) -> (-21.075, -2.025)
  line L38 (-21.075, -2.025) -> (-21.075, -17.025)
  line L39 (-21.075, -17.025) -> (-36.075, -17.025)
  line L40 (-17.025, -36.075) -> (-17.025, -21.075)
  line L41 (-17.025, -21.075) -> (-2.025, -21.075)
  line L42 (-2.025, -21.075) -> (-2.025, -36.075)
  line L43 (-2.025, -36.075) -> (-17.025, -36.075)
  line L44 (21.0775, -17.025) -> (21.0775, -2.025)
  line L45 (21.0775, -2.025) -> (36.0775, -2.025)
  line L46 (36.0775, -2.025) -> (36.0775, -17.025)
  line L47 (36.0775, -17.025) -> (21.0775, -17.025)
  line L48 (-36.075, 2.025) -> (-36.075, 17.025)
  line L49 (-36.075, 17.025) -> (-21.075, 17.025)
  line L50 (-21.075, 17.025) -> (-21.075, 2.025)
  line L51 (-21.075, 2.025) -> (-36.075, 2.025)
  line L52 (2.025, 21.075) -> (2.025, 36.075)
  line L53 (2.025, 36.075) -> (17.025, 36.075)
  line L54 (17.025, 36.075) -> (17.025, 21.075)
  line L55 (17.025, 21.075) -> (2.025, 21.075)
  line L56 (-20.575, -36.575) -> (-36.575, -36.575)
  line L57 (-36.575, -36.575) -> (-36.575, -20.575)
  line L58 (-36.575, -20.575) -> (-20.575, -20.575)
  line L59 (-20.575, -20.575) -> (-20.575, -36.575)
  line L60 (40, -42) -> (17.625, -42)
  line L61 (17.625, -42) -> (17.625, -19.025)
  line L62 (17.625, -19.025) -> (40, -19.025)
  line L63 (40, -19.025) -> (40, -42)
  line L64 (-28.575, -36.575) -> (-28.575, -20.575) construction
  line L65 (-20.575, -28.575) -> (-36.575, -28.575) construction
  dimension "d36" = 16
  dimension "d37" = 4
  dimension "d40" = 28.575
  dimension "d43" = 6
  dimension "d44" = 28.575
  dimension "d50" = 0.6
  dimension "d54" = 2
extrude "Extrude7" cut sketch "Sketch7" against normal up to surface (6.4 mm away) contours L56 L57 L58 L59 | L60 L61 L62 L63
sketch "Sketch8" plane through (0, 0, -53) normal (0, 0, -1) x (-1, 0, 0)
  line L0 (-42, 0) -> (42, 0)
  line L1 (42, 0) -> (42, 10.6)
  line L2 (42, 10.6) -> (-42, 10.6)
  line L3 (-42, 10.6) -> (-42, 0)
  line L4 (0, 0) -> (0, 10.6) construction
  line L5 (6, 10.6) -> (-6, 10.6)
  line L6 (-6, 10.6) -> (-6, 9.8)
  line L7 (-6, 9.8) -> (6, 9.8)
  line L8 (6, 9.8) -> (6, 10.6)
  dimension "d45" = 0.8
  dimension "d46" = 12
extrude "Extrude8" cut sketch "Sketch8" against normal up to surface (5 mm away) contours L2 L5 L6 L7 L8
